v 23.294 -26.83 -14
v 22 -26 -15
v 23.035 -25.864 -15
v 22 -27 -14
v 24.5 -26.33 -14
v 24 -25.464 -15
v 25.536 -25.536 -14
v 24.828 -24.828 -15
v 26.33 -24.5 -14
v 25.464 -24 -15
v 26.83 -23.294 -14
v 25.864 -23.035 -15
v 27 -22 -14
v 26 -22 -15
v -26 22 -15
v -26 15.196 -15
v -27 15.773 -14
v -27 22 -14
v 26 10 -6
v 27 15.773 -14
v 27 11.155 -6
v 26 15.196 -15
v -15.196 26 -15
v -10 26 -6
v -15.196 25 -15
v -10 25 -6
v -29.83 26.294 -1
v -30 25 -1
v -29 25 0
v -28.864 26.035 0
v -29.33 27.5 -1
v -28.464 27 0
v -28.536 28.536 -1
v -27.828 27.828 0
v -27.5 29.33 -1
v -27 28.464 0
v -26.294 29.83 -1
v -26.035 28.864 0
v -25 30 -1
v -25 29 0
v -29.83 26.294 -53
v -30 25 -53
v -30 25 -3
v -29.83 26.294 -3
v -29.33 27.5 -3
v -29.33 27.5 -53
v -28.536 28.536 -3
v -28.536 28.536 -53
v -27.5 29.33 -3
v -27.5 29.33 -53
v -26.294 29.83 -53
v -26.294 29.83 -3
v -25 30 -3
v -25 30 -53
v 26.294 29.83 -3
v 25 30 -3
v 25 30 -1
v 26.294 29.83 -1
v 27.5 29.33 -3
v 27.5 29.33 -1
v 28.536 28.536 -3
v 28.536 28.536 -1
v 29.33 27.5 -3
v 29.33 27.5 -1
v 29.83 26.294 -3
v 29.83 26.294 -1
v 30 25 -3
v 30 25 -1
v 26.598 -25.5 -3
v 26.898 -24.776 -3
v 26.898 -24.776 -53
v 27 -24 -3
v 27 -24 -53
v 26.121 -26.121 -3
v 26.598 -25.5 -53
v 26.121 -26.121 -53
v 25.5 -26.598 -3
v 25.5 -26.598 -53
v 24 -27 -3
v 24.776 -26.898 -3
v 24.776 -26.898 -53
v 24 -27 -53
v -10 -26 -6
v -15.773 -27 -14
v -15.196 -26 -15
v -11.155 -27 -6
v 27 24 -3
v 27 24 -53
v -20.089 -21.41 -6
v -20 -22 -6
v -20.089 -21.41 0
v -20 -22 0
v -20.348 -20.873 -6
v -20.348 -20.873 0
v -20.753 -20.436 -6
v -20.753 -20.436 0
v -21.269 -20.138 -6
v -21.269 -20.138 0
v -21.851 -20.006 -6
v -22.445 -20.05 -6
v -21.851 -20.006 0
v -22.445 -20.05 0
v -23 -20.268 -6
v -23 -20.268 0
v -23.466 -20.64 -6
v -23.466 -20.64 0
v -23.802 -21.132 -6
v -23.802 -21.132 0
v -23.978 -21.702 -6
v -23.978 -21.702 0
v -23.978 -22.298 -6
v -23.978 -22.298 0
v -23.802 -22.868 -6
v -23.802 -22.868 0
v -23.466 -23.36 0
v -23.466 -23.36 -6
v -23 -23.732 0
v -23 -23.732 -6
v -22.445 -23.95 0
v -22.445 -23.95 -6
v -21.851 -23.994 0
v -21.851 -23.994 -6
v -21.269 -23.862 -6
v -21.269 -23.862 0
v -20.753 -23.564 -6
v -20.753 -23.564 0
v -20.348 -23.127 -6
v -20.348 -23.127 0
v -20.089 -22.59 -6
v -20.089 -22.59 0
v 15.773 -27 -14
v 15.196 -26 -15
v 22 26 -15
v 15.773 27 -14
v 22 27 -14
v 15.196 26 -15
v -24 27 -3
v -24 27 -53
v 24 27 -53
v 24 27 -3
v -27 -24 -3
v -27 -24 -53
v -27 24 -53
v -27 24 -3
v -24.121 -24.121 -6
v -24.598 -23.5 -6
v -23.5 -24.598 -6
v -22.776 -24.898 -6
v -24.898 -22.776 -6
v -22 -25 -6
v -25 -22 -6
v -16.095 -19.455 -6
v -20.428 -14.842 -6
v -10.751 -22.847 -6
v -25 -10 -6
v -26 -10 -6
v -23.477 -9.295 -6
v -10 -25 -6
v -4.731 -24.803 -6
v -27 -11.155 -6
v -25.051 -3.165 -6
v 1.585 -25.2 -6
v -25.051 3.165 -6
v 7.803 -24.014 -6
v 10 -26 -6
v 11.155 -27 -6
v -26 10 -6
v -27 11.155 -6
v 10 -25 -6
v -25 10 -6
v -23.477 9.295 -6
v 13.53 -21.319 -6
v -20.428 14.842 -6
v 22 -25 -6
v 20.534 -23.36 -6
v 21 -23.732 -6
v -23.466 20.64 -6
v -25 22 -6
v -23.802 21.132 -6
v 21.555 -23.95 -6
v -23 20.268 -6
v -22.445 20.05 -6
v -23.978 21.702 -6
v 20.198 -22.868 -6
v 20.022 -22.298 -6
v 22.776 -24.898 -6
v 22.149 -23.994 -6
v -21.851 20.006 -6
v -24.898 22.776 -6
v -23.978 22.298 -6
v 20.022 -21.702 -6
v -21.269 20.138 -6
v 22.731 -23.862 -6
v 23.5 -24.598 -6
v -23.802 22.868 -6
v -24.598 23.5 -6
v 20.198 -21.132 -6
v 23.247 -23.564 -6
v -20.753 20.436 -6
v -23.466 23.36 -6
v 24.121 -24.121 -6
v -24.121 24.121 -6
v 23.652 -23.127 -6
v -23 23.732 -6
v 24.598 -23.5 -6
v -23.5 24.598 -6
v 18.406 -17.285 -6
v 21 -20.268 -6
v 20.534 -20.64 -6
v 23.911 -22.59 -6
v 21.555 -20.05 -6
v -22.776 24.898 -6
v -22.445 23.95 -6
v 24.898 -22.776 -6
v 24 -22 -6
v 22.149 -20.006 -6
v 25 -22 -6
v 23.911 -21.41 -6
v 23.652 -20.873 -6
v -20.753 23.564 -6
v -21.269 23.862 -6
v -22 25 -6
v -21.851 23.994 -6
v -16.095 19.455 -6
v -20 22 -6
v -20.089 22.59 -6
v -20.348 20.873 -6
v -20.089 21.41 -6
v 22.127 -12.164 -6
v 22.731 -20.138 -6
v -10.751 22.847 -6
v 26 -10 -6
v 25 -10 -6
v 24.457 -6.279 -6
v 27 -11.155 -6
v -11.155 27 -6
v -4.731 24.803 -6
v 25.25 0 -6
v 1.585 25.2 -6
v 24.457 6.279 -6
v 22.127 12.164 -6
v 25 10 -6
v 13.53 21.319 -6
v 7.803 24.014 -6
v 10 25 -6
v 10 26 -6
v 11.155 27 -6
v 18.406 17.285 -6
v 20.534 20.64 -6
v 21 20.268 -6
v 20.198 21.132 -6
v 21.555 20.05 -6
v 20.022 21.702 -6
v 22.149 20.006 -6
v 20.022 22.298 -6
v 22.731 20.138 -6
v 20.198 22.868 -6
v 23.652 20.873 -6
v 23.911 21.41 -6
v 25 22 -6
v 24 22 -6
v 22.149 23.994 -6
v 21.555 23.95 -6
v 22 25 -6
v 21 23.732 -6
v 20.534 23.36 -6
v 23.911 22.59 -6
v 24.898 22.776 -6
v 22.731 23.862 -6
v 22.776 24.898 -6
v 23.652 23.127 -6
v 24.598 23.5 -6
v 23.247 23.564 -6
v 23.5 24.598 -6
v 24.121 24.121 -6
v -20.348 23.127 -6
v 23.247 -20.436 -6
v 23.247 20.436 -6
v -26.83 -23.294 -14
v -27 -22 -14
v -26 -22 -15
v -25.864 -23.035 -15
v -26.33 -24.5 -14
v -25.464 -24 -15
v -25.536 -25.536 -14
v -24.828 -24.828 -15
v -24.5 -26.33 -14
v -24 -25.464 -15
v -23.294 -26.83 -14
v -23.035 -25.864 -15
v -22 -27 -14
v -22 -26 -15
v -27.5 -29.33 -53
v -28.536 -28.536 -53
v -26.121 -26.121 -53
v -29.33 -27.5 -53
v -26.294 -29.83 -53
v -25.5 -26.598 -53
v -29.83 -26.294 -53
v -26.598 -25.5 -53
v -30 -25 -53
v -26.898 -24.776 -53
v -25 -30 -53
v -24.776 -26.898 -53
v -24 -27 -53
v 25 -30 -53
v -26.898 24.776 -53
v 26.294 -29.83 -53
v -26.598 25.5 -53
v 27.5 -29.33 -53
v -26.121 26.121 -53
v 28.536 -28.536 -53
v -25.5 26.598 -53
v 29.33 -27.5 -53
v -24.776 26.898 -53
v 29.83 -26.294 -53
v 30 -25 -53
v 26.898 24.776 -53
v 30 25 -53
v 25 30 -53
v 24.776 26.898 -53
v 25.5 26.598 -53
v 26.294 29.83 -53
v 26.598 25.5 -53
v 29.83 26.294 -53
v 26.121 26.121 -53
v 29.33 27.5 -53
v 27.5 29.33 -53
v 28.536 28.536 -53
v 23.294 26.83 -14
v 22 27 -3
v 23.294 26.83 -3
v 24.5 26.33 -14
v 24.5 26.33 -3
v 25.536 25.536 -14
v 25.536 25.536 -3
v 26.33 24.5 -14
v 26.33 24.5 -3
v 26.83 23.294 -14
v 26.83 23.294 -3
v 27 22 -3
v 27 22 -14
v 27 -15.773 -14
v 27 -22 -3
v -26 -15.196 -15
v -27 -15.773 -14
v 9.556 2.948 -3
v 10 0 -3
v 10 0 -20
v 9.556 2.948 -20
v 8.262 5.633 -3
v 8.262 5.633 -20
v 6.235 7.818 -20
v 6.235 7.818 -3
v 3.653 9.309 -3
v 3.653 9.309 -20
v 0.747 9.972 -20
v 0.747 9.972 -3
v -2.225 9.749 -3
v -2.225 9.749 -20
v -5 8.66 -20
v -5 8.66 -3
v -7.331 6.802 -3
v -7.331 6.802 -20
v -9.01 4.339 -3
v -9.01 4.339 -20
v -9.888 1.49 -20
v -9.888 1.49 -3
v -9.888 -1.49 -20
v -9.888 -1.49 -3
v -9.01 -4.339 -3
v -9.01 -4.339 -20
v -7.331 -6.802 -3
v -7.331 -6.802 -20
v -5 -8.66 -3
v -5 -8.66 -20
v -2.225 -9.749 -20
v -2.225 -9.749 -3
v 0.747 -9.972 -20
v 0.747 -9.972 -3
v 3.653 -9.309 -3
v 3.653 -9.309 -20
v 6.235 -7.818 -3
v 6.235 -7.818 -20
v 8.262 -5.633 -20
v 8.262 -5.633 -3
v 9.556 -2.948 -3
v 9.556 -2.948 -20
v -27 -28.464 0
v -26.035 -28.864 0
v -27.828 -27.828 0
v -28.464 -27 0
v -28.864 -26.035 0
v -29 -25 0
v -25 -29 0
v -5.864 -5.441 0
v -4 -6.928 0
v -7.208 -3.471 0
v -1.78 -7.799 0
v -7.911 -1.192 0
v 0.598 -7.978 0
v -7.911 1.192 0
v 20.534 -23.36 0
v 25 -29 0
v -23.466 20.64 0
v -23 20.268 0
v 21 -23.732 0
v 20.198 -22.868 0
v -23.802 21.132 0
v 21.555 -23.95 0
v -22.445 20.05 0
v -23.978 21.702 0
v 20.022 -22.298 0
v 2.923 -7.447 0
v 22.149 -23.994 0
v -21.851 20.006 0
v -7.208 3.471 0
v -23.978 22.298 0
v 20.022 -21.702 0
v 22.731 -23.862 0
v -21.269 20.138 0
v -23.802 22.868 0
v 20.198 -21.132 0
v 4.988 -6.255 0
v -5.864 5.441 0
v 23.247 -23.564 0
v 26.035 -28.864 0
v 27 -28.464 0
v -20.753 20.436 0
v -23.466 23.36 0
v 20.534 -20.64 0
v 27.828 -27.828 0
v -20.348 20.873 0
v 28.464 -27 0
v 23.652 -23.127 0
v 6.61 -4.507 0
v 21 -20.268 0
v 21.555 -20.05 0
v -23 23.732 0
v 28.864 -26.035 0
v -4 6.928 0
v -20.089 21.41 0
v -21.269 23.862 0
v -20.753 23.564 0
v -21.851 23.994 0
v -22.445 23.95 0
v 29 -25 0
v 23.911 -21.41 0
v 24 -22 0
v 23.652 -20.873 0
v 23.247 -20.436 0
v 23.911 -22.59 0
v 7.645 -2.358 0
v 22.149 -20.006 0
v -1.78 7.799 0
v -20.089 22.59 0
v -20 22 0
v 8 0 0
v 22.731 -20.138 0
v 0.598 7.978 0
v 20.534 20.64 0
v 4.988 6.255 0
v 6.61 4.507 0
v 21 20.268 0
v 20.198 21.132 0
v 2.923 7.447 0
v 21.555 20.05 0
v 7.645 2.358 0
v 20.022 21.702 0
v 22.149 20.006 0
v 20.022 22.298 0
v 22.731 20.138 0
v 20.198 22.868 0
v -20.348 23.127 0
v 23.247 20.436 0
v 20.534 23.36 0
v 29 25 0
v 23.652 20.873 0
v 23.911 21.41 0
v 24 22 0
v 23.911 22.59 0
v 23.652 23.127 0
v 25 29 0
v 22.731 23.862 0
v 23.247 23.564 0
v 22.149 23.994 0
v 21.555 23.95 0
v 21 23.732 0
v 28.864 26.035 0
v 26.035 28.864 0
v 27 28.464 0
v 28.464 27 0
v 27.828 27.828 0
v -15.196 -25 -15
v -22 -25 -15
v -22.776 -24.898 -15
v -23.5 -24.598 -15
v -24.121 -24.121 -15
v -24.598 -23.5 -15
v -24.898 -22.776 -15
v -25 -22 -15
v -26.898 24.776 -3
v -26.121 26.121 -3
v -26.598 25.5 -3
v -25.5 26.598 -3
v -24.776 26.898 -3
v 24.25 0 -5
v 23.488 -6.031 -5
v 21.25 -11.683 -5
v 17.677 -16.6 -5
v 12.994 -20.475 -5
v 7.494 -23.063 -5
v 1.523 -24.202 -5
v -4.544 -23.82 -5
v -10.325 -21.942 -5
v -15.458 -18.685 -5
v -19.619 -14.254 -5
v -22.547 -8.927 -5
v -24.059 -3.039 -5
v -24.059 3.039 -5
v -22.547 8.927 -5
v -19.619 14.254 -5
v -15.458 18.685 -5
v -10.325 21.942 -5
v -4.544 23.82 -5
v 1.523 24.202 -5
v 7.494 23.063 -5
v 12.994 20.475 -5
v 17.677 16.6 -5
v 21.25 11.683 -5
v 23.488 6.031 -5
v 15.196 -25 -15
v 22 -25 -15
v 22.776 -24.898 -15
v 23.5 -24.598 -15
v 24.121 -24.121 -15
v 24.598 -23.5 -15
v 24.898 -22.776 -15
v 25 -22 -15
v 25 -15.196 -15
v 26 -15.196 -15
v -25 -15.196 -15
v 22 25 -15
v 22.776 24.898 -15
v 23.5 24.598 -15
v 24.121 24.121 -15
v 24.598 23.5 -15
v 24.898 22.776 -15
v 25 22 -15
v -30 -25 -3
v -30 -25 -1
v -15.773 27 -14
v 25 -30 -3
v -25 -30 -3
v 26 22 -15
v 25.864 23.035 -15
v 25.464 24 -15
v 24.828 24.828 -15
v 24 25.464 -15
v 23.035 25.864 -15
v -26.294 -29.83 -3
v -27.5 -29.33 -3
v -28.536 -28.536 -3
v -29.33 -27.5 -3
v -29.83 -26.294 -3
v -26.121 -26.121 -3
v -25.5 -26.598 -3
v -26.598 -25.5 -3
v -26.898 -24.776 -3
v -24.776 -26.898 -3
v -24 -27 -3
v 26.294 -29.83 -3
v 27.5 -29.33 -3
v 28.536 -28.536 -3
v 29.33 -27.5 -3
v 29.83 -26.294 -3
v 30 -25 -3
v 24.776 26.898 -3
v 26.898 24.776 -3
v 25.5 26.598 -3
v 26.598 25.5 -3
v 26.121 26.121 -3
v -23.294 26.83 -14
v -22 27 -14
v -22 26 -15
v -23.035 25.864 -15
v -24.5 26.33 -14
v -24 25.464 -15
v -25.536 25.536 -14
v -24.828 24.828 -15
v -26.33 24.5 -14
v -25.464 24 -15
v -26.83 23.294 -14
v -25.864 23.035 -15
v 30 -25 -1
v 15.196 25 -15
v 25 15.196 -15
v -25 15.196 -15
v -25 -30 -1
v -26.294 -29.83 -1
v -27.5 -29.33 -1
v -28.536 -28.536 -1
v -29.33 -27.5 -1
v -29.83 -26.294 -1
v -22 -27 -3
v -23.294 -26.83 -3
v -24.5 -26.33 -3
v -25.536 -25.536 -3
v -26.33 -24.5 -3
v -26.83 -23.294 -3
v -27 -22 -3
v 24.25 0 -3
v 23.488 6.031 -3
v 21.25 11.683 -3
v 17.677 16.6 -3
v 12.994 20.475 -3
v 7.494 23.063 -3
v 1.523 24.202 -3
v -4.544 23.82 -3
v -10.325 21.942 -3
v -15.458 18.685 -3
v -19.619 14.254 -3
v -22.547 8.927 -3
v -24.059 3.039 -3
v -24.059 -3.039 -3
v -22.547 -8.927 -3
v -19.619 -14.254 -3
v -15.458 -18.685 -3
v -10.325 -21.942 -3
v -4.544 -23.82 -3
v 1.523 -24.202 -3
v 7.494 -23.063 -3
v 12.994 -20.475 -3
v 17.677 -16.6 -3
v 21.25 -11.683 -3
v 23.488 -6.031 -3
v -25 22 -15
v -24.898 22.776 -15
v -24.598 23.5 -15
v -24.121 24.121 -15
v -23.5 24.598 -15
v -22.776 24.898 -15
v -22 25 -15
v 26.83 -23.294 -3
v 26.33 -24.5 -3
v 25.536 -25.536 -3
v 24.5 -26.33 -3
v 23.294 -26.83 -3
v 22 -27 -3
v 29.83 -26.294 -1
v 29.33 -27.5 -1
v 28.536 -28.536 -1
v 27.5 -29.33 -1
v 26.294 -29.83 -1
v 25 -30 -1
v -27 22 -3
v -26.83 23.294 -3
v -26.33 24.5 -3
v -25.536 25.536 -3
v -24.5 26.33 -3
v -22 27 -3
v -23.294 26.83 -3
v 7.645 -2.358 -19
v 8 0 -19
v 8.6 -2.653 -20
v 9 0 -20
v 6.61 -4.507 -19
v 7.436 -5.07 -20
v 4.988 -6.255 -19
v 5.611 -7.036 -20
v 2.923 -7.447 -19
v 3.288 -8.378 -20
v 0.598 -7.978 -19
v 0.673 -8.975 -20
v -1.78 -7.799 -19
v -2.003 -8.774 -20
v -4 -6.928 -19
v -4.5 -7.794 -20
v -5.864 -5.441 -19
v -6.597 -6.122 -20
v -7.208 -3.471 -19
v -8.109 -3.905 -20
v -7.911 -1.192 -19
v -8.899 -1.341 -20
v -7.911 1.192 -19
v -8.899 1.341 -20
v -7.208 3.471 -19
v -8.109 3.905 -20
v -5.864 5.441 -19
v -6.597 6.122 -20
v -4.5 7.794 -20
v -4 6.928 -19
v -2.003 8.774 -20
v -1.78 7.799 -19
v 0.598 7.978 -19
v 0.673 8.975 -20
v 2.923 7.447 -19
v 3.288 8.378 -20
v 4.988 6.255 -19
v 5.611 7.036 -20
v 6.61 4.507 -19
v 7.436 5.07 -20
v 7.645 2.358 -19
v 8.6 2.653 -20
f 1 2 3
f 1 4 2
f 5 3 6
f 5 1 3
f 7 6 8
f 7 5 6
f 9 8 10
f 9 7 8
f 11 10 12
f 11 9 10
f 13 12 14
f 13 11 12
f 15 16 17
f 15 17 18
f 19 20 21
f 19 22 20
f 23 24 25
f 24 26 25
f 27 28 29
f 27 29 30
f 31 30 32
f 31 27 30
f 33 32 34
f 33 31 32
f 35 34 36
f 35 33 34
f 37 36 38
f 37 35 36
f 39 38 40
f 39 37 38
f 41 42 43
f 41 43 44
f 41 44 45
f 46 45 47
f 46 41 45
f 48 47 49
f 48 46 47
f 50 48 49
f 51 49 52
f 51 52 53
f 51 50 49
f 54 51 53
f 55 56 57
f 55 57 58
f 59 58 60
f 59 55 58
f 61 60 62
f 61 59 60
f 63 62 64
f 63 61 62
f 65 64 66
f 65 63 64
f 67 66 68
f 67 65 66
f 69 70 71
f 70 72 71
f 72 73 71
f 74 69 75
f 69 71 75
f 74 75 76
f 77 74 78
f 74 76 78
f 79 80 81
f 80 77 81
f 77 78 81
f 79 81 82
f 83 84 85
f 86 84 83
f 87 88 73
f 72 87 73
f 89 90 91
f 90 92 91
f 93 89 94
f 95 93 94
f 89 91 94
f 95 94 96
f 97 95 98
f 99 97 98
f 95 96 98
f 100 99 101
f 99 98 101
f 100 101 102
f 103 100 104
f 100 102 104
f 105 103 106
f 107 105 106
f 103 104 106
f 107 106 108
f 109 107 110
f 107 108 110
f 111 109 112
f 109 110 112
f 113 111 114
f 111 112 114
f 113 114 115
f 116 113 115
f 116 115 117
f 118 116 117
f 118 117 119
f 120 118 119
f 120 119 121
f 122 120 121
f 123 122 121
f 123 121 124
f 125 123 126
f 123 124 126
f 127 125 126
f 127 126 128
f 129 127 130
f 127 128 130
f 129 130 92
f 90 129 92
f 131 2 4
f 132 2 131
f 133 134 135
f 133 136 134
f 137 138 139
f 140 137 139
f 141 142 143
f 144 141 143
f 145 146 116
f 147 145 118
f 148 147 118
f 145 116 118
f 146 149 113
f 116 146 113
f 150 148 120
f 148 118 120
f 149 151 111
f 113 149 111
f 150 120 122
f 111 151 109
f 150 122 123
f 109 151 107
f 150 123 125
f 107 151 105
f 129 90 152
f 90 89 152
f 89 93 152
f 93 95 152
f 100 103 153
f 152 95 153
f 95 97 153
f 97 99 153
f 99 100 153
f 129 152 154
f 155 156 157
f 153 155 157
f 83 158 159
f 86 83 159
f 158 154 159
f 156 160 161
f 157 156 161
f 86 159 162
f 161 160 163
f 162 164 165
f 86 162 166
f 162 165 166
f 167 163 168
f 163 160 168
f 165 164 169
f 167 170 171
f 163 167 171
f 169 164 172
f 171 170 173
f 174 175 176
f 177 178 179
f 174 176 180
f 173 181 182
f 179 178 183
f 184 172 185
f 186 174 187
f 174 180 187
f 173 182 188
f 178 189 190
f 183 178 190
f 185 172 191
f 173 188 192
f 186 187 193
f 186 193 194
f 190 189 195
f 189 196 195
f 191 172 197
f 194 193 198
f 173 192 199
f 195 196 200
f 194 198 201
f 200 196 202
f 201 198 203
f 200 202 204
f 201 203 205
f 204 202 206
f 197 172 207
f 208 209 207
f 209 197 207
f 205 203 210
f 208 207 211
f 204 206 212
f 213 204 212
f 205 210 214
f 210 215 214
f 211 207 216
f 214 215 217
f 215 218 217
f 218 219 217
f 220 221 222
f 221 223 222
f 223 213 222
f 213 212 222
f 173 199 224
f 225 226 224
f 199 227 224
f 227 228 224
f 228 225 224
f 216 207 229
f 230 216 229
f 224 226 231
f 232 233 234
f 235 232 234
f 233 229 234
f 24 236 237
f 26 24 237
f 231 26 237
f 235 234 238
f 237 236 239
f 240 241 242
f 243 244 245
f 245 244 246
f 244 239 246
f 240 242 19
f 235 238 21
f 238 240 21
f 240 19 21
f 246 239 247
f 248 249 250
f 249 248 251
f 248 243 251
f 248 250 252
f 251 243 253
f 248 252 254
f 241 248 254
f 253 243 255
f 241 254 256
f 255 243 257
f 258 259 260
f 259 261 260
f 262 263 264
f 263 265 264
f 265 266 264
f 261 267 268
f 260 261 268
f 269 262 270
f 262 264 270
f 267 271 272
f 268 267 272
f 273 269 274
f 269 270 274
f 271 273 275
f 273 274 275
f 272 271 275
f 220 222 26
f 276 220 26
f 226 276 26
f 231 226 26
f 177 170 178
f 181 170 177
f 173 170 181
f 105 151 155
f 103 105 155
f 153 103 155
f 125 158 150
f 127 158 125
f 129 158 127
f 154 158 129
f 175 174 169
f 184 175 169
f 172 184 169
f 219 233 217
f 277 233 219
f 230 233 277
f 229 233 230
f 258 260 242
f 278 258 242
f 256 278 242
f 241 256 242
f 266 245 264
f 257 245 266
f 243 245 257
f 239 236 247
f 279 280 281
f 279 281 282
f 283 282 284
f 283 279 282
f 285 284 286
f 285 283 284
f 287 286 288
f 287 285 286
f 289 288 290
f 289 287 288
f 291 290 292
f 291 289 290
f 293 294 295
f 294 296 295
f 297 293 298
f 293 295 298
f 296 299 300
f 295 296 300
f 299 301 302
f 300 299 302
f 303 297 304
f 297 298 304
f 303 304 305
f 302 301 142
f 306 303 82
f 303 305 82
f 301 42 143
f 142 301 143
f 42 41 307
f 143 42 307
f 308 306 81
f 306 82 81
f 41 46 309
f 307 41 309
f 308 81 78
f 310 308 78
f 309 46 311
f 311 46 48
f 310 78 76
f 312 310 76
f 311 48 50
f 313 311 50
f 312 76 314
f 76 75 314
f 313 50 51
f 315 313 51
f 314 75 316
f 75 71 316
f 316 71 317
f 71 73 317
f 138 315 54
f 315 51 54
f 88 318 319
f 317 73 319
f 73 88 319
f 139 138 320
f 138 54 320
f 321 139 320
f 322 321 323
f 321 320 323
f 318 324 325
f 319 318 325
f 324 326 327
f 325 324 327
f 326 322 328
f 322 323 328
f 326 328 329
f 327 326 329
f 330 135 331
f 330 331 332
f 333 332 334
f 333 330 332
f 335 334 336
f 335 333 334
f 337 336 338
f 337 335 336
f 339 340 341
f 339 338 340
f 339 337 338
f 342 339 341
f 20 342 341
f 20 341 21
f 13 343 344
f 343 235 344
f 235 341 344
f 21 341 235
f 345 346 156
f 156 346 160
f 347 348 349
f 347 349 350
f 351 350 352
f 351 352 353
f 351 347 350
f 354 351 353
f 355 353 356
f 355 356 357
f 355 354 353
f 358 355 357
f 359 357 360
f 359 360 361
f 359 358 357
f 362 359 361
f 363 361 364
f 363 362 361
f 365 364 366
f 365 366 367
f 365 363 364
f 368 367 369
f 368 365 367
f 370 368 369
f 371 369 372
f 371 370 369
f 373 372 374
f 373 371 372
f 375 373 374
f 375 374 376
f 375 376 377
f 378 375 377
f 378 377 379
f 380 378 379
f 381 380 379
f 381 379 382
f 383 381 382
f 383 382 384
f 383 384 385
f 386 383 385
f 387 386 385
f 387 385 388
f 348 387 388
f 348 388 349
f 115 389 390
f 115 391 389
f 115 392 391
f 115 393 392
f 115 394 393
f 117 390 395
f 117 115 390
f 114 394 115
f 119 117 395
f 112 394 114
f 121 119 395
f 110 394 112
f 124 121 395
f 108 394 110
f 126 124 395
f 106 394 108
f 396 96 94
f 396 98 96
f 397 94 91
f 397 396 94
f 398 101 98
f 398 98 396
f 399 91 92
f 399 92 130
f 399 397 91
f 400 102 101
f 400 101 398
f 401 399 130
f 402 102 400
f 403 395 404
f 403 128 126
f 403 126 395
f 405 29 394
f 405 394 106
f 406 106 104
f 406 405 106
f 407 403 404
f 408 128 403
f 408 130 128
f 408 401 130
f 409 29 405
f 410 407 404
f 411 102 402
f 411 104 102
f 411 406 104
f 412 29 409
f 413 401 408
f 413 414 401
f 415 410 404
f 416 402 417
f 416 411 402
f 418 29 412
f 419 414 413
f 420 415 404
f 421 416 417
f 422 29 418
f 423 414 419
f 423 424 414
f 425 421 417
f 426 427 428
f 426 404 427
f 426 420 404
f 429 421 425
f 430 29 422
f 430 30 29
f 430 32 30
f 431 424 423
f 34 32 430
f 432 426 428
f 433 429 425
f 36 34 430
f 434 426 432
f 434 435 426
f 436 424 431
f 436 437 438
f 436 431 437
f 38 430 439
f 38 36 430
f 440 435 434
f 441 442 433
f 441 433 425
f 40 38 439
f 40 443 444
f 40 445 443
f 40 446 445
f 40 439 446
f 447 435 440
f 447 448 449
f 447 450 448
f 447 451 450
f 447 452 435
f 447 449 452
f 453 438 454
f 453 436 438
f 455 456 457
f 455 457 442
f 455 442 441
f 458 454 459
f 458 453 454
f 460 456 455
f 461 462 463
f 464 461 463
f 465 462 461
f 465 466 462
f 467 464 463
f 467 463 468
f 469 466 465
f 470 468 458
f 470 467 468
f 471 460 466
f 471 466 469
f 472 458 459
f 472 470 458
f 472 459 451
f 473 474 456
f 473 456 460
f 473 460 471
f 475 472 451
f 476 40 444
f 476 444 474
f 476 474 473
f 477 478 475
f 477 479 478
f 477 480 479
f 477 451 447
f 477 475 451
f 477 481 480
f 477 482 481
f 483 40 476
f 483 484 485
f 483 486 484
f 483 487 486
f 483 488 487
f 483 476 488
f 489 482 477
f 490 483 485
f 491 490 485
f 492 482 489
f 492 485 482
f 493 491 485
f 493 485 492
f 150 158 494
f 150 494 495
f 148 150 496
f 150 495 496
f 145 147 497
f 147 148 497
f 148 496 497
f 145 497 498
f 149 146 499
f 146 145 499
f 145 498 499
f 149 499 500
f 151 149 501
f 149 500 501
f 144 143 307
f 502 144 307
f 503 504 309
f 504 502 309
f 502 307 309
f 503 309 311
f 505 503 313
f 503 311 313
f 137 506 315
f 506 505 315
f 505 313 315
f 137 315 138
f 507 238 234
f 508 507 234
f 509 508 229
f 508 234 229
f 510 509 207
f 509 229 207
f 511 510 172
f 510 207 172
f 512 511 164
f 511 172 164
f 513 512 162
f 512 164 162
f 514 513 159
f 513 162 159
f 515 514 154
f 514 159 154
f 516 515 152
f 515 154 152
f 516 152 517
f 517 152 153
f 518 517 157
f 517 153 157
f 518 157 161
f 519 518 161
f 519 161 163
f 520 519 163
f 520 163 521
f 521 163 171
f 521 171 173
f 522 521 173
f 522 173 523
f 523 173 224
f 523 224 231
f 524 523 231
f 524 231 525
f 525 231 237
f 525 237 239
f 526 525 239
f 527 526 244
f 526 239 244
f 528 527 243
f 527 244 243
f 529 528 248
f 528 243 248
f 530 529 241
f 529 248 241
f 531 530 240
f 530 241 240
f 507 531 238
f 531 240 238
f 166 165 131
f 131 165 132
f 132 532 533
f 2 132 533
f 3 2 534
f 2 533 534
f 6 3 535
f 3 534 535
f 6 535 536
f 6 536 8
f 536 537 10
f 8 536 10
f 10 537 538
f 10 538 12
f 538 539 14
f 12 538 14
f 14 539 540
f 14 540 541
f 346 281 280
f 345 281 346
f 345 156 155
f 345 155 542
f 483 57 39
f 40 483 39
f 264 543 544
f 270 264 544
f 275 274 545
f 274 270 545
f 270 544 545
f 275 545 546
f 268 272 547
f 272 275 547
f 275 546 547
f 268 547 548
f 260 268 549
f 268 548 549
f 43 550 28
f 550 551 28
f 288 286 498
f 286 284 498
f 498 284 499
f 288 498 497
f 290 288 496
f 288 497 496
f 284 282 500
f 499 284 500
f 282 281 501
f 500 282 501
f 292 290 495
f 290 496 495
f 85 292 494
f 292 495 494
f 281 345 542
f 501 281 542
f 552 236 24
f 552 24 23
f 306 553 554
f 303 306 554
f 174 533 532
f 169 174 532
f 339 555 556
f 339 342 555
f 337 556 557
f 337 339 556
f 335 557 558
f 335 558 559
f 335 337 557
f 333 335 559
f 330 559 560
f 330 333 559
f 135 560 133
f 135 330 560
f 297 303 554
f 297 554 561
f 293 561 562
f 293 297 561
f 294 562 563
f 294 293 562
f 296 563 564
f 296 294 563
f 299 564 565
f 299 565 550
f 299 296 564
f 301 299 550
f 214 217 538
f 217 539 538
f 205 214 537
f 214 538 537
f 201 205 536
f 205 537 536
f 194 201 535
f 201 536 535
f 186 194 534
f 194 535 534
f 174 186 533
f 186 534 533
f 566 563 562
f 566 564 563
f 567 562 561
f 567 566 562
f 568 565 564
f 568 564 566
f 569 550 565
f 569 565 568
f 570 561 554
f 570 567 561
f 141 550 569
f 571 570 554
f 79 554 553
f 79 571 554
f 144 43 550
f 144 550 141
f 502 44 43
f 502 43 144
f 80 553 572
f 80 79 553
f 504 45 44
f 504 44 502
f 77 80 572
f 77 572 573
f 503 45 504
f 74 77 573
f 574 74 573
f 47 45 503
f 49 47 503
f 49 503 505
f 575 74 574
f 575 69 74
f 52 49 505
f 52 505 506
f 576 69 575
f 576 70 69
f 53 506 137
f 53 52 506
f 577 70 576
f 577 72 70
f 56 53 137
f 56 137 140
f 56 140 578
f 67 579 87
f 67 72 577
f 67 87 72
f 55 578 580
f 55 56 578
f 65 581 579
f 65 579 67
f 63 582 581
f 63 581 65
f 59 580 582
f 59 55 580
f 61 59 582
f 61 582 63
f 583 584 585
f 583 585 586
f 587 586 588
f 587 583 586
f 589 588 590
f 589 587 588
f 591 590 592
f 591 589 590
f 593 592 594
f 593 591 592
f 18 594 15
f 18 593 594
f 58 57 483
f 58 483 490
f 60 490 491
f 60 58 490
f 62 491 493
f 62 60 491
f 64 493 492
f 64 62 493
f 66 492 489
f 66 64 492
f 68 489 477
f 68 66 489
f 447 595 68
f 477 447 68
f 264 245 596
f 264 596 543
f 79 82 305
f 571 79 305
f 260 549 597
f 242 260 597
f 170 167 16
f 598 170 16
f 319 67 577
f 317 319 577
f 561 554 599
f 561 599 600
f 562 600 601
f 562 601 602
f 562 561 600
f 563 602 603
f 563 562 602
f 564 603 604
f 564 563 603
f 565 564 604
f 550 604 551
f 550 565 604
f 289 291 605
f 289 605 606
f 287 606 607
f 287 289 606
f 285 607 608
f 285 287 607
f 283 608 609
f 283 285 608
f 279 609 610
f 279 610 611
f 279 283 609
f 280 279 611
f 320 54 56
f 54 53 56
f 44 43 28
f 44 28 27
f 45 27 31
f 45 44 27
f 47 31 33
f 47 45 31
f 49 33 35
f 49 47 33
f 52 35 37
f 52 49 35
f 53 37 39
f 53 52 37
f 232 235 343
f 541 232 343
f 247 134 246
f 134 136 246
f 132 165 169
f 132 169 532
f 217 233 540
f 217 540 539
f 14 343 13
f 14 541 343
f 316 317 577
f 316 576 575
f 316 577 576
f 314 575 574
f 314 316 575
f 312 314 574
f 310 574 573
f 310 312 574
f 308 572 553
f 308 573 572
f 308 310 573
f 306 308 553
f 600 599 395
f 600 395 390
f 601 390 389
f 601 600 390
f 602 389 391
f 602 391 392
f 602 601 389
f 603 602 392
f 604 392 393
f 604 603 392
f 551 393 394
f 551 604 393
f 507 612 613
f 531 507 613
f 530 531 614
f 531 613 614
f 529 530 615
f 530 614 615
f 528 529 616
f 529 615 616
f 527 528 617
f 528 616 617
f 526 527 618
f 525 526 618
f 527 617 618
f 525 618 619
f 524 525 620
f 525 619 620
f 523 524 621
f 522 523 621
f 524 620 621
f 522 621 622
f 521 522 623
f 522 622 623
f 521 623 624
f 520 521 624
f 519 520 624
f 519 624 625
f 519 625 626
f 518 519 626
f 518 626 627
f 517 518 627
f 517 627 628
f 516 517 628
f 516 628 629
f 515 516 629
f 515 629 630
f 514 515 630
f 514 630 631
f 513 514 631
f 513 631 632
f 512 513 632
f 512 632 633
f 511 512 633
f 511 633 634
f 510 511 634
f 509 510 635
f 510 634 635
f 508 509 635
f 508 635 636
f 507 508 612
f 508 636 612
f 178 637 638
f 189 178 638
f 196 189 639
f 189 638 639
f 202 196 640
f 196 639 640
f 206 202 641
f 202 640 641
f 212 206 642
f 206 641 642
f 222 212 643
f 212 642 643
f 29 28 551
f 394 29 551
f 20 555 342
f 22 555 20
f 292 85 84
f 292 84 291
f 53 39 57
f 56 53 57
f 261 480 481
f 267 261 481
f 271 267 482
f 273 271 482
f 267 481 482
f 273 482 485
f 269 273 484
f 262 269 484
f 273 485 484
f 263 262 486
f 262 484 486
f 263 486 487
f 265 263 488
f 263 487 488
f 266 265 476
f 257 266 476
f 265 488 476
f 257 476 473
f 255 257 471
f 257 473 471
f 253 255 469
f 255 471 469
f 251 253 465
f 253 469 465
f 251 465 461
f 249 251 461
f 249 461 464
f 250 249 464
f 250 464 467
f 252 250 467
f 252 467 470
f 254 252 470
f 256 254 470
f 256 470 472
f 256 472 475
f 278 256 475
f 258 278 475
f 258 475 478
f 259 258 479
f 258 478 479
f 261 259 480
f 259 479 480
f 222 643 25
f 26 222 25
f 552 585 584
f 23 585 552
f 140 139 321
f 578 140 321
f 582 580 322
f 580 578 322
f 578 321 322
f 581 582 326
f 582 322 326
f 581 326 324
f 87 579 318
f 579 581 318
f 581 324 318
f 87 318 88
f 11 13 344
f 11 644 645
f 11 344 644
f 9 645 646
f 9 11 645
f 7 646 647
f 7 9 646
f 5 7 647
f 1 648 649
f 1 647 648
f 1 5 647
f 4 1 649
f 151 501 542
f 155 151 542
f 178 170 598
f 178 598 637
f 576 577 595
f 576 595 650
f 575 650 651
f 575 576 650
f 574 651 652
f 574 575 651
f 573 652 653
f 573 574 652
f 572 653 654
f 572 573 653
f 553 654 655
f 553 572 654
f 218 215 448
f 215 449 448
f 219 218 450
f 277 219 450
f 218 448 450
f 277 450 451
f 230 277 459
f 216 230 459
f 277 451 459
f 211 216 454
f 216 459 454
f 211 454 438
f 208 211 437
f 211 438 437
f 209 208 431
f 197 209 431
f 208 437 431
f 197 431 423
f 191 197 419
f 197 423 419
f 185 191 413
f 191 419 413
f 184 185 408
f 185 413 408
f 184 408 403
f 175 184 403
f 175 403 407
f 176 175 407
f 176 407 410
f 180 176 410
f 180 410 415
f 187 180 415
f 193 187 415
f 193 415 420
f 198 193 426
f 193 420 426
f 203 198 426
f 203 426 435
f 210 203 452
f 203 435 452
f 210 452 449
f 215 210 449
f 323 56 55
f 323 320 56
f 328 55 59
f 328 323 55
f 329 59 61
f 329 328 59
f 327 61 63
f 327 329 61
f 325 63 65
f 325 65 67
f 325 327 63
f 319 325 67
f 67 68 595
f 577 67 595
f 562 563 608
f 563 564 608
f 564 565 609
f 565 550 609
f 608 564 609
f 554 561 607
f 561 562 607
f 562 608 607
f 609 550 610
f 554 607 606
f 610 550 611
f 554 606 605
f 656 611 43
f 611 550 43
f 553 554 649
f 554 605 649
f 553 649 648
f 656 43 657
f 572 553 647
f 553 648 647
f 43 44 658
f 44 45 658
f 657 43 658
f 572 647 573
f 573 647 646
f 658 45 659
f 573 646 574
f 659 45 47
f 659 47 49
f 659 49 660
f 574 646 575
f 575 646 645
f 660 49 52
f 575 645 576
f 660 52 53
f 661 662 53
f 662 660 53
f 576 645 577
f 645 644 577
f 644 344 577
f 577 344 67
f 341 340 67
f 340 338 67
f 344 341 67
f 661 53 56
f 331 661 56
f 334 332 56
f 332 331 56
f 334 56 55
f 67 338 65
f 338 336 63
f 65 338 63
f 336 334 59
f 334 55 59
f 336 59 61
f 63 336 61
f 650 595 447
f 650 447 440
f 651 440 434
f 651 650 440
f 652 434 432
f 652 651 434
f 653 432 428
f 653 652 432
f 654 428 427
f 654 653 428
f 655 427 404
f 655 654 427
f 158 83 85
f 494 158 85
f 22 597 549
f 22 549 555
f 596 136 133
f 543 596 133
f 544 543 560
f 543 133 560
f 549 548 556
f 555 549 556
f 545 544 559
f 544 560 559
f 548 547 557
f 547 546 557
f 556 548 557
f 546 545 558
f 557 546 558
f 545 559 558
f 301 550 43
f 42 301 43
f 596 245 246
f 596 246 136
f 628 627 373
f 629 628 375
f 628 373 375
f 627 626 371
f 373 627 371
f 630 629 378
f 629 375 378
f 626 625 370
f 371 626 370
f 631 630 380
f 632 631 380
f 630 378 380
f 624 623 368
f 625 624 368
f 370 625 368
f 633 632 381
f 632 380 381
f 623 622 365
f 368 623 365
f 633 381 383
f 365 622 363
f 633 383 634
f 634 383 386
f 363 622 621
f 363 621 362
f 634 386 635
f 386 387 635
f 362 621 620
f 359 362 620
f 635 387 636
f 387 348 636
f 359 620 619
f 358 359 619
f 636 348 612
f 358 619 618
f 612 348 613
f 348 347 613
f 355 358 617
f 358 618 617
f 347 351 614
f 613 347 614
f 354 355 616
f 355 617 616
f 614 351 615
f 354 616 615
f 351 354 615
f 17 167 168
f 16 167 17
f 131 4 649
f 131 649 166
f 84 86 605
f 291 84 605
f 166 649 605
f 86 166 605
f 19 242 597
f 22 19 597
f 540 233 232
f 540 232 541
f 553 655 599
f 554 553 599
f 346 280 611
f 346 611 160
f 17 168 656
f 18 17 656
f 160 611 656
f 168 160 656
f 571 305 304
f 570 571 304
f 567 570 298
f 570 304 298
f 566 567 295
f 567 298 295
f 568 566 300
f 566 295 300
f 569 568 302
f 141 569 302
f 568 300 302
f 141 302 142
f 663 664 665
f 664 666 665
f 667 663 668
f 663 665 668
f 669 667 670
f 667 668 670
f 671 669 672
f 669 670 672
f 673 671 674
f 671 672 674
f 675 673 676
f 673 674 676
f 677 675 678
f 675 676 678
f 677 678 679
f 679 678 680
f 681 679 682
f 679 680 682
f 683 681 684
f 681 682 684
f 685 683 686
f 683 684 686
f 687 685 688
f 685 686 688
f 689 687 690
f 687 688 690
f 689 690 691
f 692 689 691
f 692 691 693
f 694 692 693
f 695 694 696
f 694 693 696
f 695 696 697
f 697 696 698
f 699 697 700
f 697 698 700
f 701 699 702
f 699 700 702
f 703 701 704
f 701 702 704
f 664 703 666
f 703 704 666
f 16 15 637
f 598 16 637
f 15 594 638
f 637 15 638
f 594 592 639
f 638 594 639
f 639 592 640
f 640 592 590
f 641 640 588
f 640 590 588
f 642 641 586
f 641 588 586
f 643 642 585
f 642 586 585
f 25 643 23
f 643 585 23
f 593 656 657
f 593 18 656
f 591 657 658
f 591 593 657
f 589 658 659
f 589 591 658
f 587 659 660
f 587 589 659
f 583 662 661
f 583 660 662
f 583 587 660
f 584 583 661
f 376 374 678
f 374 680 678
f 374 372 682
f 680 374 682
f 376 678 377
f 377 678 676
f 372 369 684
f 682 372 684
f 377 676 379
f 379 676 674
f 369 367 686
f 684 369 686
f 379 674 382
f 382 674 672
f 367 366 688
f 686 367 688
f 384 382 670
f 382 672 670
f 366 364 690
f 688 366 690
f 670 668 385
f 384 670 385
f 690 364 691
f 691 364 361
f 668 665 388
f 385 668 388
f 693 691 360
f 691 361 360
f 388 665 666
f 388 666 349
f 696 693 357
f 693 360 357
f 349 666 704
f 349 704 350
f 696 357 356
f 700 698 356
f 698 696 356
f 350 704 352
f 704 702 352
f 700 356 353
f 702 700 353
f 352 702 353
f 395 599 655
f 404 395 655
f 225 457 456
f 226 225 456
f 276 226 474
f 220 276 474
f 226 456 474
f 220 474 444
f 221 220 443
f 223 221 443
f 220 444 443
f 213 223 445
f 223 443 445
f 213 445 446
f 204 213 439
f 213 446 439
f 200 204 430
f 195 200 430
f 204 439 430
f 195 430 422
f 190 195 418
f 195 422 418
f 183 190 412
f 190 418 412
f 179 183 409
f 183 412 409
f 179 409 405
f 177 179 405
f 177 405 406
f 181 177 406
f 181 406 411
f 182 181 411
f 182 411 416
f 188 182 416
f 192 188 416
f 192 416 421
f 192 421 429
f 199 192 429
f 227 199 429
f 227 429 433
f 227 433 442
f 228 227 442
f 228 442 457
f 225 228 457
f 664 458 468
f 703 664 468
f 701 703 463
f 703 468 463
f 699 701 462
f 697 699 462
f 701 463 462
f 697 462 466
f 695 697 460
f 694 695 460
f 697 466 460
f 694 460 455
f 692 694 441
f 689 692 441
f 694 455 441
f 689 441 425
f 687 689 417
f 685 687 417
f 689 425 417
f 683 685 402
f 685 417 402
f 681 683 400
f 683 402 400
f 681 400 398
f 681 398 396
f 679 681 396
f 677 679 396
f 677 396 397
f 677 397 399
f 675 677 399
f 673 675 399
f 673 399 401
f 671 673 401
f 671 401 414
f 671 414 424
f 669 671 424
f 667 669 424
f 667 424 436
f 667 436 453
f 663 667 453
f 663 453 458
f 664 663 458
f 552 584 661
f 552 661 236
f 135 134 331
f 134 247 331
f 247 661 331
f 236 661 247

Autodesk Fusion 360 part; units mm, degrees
sketch "Common" plane through (0, 0, 0) normal (0, 0, 1) x (1, 0, 0)
  line L0 (30, -30) -> (-30, -30)
  line L1 (-30, -30) -> (-30, 30)
  line L2 (-30, 30) -> (30, 30)
  line L3 (30, 30) -> (30, -30)
  line L4 (30, -30) -> (-30, 30) construction
  line L5 (-30, -30) -> (30, 30) construction
  circle A0 centre (0, 0) radius 8
  circle A1 centre (0, 0) radius 10
  line L6 (-27, -27) -> (-27, 27)
  line L7 (-27, 27) -> (27, 27)
  line L8 (27, 27) -> (27, -27)
  line L9 (27, -27) -> (-27, -27)
  circle A2 centre (22, -22) radius 2
  circle A3 centre (22, 22) radius 2
  circle A4 centre (-22, 22) radius 2
  circle A5 centre (-22, -22) radius 2
  line L10 (25, -25) -> (-25, -25)
  line L11 (-25, -25) -> (-25, 25)
  line L12 (-25, 25) -> (25, 25)
  line L13 (25, 25) -> (25, -25)
  circle A6 centre (0, 0) radius 24.25
  circle A7 centre (22, 22) radius 3
  circle A8 centre (22, -22) radius 3
  circle A9 centre (-22, -22) radius 3
  circle A10 centre (-22, 22) radius 3
  dimension "d1" = 60
  dimension "d2" = 60
  dimension "d3" = 16
  dimension "d4" = 2
  dimension "d5" = 3
  dimension "d6" = 4
  dimension "d8" = 8
  dimension "d10" = 360
  dimension "d11" = 5
  dimension "d31" = 48.5
  dimension "d133" = 1
  dimension "d134" = 1
  dimension "d135" = 1
  dimension "d136" = 1
extrude "Extrude1" add sketch "Common" against normal blind 50 from surface at -3 contours L0 L1 L2 L3 makes body 1 in component "Pole"
fillet "Fillet1" radius 5 4 edges at (-30, -30, -28) (30, -30, -28) (30, 30, -28) (-30, 30, -28) on bodies 1 in component "Pole"
fillet "Fillet1" radius 3 4 edges at (27, 27, -28) (-27, 27, -28) (-27, -27, -28) (27, -27, -28) on bodies 1 in component "Pole"
extrude "Extrude2" add sketch "Common" against normal blind 3 separate body contours L0 L1 L2 L3 makes body 2 in component "Plug"
extrude "Extrude3" add sketch "Common" against normal blind 15 contours L6 L7 L8 L9 bodies 2 in component "Plug"
extrude "Extrude4" add sketch "Common" against normal blind 6 contours L10 L13 A8 | L10 L11 L12 L13 A7 A8 A9 A10 | A8 | L10 L11 A9 | A9 | L12 L13 A7 | A7 | L11 L12 A10 | A10 | A6 bodies 2 in component "Plug"
sketch "Flange cutout1" plane through (0, 0, 0) normal (0, 1, 0) x (1, 0, 0) in component "Plug"
  line L0 (0, 0) -> (0, 40) construction
  line L1 (0, 6) -> (10, 6)
  line L2 (10, 6) -> (25, 31.9808)
  line L3 (10, 6) -> (37, 6) construction
  line L4 (25, 31.9808) -> (0, 31.9808)
  line L5 (-25, 31.9808) -> (0, 31.9808)
  line L6 (0, 6) -> (-10, 6)
  line L7 (-10, 6) -> (-25, 31.9808)
  dimension "d90" = 40
  dimension "d91" = 10
  dimension "d92" = 6
  dimension "d93" = 30
  dimension "d94" = 60
extrude "Extrude6" cut sketch "Flange cutout1" along normal mid plane 100 bodies 2 in component "Plug"
sketch "Flange cutout2" plane through (0, 0, 0) normal (1, 0, 0) x (0, 1, 0) in component "Plug"
  line L0 (-25, -31.9808) -> (0, -31.9808)
  line L1 (0, -6) -> (10, -6)
  line L2 (-10, -6) -> (-25, -31.9808)
  line L3 (0, -6) -> (-10, -6)
  line L4 (-10, -6) -> (-37, -6) construction
  line L5 (0, 0) -> (0, -40) construction
  line L6 (10, -6) -> (25, -31.9808)
  line L7 (25, -31.9808) -> (0, -31.9808)
  point P0 (0.1488, 0.1515)
  dimension "d104" = 40
  dimension "d105" = 10
  dimension "d106" = 6
  dimension "d107" = 30
  dimension "d108" = 60
extrude "Extrude7" cut sketch "Flange cutout2" along normal mid plane 200 bodies 2 in component "Plug"
extrude "Extrude5" add sketch "Common" against normal blind 20 contours A1 bodies 2 in component "Plug"
fillet "Fillet1'" radius 5 4 edges at (-30, -30, -1.5) (30, -30, -1.5) (30, 30, -1.5) (-30, 30, -1.5) on bodies 2 in component "Plug"
fillet "Fillet1'" radius 5 4 edges at (-27, 27, -9) (-27, -27, -9) (27, 27, -9) (27, -27, -9) on bodies 2 in component "Plug"
fillet "Fillet1'" radius 3 4 edges at (-25, 25, -10.5) (25, 25, -10.5) (-25, -25, -10.5) (25, -25, -10.5) on bodies 2 in component "Plug"
extrude "Extrude8" cut sketch "Common" against normal blind 3 from surface at -3 contours A6 bodies 2 in component "Plug"
chamfer "Chamfer1" distance 1 angle 45 30 edges at (0, -30, 0) (-28.5355, -28.5355, 0) (-30, 0, 0) (-28.5355, 28.5355, 0) (0, 30, 0) (28.5355, 28.5355, 0) (30, 0, 0) (28.5355, -28.5355, 0) (27, -18.5981, -15) (25.5355, -25.5355, -15) (18.5981, -27, -15) (27, -12.5981, -10.5) (27, 12.5981, -10.5) (25.5355, 25.5355, -15) (27, 18.5981, -15) (18.5981, 27, -15) (-18.5981, 27, -15) (-25.5355, 25.5355, -15) (-27, 18.5981, -15) (-18.5981, -27, -15) (-25.5355, -25.5355, -15) (-27, -18.5981, -15) (-12.5981, -27, -10.5) (-12.5981, 27, -10.5) (12.5981, 27, -10.5) (12.5981, -27, -10.5) (-27, -12.5981, -10.5) (-27, 12.5981, -10.5) (-7.4586, -2.8929, -20) (-22.6089, -8.7692, -6) on bodies 2 in component "Plug"
component "Pole" placed x (1, 0, 0) y (0, 1, 0) z (0, 0, 1) at (0, 0, 0)
component "Plug" placed x (1, 0, 0) y (0, 1, 0) z (0, 0, 1) at (0, 0, 0)
